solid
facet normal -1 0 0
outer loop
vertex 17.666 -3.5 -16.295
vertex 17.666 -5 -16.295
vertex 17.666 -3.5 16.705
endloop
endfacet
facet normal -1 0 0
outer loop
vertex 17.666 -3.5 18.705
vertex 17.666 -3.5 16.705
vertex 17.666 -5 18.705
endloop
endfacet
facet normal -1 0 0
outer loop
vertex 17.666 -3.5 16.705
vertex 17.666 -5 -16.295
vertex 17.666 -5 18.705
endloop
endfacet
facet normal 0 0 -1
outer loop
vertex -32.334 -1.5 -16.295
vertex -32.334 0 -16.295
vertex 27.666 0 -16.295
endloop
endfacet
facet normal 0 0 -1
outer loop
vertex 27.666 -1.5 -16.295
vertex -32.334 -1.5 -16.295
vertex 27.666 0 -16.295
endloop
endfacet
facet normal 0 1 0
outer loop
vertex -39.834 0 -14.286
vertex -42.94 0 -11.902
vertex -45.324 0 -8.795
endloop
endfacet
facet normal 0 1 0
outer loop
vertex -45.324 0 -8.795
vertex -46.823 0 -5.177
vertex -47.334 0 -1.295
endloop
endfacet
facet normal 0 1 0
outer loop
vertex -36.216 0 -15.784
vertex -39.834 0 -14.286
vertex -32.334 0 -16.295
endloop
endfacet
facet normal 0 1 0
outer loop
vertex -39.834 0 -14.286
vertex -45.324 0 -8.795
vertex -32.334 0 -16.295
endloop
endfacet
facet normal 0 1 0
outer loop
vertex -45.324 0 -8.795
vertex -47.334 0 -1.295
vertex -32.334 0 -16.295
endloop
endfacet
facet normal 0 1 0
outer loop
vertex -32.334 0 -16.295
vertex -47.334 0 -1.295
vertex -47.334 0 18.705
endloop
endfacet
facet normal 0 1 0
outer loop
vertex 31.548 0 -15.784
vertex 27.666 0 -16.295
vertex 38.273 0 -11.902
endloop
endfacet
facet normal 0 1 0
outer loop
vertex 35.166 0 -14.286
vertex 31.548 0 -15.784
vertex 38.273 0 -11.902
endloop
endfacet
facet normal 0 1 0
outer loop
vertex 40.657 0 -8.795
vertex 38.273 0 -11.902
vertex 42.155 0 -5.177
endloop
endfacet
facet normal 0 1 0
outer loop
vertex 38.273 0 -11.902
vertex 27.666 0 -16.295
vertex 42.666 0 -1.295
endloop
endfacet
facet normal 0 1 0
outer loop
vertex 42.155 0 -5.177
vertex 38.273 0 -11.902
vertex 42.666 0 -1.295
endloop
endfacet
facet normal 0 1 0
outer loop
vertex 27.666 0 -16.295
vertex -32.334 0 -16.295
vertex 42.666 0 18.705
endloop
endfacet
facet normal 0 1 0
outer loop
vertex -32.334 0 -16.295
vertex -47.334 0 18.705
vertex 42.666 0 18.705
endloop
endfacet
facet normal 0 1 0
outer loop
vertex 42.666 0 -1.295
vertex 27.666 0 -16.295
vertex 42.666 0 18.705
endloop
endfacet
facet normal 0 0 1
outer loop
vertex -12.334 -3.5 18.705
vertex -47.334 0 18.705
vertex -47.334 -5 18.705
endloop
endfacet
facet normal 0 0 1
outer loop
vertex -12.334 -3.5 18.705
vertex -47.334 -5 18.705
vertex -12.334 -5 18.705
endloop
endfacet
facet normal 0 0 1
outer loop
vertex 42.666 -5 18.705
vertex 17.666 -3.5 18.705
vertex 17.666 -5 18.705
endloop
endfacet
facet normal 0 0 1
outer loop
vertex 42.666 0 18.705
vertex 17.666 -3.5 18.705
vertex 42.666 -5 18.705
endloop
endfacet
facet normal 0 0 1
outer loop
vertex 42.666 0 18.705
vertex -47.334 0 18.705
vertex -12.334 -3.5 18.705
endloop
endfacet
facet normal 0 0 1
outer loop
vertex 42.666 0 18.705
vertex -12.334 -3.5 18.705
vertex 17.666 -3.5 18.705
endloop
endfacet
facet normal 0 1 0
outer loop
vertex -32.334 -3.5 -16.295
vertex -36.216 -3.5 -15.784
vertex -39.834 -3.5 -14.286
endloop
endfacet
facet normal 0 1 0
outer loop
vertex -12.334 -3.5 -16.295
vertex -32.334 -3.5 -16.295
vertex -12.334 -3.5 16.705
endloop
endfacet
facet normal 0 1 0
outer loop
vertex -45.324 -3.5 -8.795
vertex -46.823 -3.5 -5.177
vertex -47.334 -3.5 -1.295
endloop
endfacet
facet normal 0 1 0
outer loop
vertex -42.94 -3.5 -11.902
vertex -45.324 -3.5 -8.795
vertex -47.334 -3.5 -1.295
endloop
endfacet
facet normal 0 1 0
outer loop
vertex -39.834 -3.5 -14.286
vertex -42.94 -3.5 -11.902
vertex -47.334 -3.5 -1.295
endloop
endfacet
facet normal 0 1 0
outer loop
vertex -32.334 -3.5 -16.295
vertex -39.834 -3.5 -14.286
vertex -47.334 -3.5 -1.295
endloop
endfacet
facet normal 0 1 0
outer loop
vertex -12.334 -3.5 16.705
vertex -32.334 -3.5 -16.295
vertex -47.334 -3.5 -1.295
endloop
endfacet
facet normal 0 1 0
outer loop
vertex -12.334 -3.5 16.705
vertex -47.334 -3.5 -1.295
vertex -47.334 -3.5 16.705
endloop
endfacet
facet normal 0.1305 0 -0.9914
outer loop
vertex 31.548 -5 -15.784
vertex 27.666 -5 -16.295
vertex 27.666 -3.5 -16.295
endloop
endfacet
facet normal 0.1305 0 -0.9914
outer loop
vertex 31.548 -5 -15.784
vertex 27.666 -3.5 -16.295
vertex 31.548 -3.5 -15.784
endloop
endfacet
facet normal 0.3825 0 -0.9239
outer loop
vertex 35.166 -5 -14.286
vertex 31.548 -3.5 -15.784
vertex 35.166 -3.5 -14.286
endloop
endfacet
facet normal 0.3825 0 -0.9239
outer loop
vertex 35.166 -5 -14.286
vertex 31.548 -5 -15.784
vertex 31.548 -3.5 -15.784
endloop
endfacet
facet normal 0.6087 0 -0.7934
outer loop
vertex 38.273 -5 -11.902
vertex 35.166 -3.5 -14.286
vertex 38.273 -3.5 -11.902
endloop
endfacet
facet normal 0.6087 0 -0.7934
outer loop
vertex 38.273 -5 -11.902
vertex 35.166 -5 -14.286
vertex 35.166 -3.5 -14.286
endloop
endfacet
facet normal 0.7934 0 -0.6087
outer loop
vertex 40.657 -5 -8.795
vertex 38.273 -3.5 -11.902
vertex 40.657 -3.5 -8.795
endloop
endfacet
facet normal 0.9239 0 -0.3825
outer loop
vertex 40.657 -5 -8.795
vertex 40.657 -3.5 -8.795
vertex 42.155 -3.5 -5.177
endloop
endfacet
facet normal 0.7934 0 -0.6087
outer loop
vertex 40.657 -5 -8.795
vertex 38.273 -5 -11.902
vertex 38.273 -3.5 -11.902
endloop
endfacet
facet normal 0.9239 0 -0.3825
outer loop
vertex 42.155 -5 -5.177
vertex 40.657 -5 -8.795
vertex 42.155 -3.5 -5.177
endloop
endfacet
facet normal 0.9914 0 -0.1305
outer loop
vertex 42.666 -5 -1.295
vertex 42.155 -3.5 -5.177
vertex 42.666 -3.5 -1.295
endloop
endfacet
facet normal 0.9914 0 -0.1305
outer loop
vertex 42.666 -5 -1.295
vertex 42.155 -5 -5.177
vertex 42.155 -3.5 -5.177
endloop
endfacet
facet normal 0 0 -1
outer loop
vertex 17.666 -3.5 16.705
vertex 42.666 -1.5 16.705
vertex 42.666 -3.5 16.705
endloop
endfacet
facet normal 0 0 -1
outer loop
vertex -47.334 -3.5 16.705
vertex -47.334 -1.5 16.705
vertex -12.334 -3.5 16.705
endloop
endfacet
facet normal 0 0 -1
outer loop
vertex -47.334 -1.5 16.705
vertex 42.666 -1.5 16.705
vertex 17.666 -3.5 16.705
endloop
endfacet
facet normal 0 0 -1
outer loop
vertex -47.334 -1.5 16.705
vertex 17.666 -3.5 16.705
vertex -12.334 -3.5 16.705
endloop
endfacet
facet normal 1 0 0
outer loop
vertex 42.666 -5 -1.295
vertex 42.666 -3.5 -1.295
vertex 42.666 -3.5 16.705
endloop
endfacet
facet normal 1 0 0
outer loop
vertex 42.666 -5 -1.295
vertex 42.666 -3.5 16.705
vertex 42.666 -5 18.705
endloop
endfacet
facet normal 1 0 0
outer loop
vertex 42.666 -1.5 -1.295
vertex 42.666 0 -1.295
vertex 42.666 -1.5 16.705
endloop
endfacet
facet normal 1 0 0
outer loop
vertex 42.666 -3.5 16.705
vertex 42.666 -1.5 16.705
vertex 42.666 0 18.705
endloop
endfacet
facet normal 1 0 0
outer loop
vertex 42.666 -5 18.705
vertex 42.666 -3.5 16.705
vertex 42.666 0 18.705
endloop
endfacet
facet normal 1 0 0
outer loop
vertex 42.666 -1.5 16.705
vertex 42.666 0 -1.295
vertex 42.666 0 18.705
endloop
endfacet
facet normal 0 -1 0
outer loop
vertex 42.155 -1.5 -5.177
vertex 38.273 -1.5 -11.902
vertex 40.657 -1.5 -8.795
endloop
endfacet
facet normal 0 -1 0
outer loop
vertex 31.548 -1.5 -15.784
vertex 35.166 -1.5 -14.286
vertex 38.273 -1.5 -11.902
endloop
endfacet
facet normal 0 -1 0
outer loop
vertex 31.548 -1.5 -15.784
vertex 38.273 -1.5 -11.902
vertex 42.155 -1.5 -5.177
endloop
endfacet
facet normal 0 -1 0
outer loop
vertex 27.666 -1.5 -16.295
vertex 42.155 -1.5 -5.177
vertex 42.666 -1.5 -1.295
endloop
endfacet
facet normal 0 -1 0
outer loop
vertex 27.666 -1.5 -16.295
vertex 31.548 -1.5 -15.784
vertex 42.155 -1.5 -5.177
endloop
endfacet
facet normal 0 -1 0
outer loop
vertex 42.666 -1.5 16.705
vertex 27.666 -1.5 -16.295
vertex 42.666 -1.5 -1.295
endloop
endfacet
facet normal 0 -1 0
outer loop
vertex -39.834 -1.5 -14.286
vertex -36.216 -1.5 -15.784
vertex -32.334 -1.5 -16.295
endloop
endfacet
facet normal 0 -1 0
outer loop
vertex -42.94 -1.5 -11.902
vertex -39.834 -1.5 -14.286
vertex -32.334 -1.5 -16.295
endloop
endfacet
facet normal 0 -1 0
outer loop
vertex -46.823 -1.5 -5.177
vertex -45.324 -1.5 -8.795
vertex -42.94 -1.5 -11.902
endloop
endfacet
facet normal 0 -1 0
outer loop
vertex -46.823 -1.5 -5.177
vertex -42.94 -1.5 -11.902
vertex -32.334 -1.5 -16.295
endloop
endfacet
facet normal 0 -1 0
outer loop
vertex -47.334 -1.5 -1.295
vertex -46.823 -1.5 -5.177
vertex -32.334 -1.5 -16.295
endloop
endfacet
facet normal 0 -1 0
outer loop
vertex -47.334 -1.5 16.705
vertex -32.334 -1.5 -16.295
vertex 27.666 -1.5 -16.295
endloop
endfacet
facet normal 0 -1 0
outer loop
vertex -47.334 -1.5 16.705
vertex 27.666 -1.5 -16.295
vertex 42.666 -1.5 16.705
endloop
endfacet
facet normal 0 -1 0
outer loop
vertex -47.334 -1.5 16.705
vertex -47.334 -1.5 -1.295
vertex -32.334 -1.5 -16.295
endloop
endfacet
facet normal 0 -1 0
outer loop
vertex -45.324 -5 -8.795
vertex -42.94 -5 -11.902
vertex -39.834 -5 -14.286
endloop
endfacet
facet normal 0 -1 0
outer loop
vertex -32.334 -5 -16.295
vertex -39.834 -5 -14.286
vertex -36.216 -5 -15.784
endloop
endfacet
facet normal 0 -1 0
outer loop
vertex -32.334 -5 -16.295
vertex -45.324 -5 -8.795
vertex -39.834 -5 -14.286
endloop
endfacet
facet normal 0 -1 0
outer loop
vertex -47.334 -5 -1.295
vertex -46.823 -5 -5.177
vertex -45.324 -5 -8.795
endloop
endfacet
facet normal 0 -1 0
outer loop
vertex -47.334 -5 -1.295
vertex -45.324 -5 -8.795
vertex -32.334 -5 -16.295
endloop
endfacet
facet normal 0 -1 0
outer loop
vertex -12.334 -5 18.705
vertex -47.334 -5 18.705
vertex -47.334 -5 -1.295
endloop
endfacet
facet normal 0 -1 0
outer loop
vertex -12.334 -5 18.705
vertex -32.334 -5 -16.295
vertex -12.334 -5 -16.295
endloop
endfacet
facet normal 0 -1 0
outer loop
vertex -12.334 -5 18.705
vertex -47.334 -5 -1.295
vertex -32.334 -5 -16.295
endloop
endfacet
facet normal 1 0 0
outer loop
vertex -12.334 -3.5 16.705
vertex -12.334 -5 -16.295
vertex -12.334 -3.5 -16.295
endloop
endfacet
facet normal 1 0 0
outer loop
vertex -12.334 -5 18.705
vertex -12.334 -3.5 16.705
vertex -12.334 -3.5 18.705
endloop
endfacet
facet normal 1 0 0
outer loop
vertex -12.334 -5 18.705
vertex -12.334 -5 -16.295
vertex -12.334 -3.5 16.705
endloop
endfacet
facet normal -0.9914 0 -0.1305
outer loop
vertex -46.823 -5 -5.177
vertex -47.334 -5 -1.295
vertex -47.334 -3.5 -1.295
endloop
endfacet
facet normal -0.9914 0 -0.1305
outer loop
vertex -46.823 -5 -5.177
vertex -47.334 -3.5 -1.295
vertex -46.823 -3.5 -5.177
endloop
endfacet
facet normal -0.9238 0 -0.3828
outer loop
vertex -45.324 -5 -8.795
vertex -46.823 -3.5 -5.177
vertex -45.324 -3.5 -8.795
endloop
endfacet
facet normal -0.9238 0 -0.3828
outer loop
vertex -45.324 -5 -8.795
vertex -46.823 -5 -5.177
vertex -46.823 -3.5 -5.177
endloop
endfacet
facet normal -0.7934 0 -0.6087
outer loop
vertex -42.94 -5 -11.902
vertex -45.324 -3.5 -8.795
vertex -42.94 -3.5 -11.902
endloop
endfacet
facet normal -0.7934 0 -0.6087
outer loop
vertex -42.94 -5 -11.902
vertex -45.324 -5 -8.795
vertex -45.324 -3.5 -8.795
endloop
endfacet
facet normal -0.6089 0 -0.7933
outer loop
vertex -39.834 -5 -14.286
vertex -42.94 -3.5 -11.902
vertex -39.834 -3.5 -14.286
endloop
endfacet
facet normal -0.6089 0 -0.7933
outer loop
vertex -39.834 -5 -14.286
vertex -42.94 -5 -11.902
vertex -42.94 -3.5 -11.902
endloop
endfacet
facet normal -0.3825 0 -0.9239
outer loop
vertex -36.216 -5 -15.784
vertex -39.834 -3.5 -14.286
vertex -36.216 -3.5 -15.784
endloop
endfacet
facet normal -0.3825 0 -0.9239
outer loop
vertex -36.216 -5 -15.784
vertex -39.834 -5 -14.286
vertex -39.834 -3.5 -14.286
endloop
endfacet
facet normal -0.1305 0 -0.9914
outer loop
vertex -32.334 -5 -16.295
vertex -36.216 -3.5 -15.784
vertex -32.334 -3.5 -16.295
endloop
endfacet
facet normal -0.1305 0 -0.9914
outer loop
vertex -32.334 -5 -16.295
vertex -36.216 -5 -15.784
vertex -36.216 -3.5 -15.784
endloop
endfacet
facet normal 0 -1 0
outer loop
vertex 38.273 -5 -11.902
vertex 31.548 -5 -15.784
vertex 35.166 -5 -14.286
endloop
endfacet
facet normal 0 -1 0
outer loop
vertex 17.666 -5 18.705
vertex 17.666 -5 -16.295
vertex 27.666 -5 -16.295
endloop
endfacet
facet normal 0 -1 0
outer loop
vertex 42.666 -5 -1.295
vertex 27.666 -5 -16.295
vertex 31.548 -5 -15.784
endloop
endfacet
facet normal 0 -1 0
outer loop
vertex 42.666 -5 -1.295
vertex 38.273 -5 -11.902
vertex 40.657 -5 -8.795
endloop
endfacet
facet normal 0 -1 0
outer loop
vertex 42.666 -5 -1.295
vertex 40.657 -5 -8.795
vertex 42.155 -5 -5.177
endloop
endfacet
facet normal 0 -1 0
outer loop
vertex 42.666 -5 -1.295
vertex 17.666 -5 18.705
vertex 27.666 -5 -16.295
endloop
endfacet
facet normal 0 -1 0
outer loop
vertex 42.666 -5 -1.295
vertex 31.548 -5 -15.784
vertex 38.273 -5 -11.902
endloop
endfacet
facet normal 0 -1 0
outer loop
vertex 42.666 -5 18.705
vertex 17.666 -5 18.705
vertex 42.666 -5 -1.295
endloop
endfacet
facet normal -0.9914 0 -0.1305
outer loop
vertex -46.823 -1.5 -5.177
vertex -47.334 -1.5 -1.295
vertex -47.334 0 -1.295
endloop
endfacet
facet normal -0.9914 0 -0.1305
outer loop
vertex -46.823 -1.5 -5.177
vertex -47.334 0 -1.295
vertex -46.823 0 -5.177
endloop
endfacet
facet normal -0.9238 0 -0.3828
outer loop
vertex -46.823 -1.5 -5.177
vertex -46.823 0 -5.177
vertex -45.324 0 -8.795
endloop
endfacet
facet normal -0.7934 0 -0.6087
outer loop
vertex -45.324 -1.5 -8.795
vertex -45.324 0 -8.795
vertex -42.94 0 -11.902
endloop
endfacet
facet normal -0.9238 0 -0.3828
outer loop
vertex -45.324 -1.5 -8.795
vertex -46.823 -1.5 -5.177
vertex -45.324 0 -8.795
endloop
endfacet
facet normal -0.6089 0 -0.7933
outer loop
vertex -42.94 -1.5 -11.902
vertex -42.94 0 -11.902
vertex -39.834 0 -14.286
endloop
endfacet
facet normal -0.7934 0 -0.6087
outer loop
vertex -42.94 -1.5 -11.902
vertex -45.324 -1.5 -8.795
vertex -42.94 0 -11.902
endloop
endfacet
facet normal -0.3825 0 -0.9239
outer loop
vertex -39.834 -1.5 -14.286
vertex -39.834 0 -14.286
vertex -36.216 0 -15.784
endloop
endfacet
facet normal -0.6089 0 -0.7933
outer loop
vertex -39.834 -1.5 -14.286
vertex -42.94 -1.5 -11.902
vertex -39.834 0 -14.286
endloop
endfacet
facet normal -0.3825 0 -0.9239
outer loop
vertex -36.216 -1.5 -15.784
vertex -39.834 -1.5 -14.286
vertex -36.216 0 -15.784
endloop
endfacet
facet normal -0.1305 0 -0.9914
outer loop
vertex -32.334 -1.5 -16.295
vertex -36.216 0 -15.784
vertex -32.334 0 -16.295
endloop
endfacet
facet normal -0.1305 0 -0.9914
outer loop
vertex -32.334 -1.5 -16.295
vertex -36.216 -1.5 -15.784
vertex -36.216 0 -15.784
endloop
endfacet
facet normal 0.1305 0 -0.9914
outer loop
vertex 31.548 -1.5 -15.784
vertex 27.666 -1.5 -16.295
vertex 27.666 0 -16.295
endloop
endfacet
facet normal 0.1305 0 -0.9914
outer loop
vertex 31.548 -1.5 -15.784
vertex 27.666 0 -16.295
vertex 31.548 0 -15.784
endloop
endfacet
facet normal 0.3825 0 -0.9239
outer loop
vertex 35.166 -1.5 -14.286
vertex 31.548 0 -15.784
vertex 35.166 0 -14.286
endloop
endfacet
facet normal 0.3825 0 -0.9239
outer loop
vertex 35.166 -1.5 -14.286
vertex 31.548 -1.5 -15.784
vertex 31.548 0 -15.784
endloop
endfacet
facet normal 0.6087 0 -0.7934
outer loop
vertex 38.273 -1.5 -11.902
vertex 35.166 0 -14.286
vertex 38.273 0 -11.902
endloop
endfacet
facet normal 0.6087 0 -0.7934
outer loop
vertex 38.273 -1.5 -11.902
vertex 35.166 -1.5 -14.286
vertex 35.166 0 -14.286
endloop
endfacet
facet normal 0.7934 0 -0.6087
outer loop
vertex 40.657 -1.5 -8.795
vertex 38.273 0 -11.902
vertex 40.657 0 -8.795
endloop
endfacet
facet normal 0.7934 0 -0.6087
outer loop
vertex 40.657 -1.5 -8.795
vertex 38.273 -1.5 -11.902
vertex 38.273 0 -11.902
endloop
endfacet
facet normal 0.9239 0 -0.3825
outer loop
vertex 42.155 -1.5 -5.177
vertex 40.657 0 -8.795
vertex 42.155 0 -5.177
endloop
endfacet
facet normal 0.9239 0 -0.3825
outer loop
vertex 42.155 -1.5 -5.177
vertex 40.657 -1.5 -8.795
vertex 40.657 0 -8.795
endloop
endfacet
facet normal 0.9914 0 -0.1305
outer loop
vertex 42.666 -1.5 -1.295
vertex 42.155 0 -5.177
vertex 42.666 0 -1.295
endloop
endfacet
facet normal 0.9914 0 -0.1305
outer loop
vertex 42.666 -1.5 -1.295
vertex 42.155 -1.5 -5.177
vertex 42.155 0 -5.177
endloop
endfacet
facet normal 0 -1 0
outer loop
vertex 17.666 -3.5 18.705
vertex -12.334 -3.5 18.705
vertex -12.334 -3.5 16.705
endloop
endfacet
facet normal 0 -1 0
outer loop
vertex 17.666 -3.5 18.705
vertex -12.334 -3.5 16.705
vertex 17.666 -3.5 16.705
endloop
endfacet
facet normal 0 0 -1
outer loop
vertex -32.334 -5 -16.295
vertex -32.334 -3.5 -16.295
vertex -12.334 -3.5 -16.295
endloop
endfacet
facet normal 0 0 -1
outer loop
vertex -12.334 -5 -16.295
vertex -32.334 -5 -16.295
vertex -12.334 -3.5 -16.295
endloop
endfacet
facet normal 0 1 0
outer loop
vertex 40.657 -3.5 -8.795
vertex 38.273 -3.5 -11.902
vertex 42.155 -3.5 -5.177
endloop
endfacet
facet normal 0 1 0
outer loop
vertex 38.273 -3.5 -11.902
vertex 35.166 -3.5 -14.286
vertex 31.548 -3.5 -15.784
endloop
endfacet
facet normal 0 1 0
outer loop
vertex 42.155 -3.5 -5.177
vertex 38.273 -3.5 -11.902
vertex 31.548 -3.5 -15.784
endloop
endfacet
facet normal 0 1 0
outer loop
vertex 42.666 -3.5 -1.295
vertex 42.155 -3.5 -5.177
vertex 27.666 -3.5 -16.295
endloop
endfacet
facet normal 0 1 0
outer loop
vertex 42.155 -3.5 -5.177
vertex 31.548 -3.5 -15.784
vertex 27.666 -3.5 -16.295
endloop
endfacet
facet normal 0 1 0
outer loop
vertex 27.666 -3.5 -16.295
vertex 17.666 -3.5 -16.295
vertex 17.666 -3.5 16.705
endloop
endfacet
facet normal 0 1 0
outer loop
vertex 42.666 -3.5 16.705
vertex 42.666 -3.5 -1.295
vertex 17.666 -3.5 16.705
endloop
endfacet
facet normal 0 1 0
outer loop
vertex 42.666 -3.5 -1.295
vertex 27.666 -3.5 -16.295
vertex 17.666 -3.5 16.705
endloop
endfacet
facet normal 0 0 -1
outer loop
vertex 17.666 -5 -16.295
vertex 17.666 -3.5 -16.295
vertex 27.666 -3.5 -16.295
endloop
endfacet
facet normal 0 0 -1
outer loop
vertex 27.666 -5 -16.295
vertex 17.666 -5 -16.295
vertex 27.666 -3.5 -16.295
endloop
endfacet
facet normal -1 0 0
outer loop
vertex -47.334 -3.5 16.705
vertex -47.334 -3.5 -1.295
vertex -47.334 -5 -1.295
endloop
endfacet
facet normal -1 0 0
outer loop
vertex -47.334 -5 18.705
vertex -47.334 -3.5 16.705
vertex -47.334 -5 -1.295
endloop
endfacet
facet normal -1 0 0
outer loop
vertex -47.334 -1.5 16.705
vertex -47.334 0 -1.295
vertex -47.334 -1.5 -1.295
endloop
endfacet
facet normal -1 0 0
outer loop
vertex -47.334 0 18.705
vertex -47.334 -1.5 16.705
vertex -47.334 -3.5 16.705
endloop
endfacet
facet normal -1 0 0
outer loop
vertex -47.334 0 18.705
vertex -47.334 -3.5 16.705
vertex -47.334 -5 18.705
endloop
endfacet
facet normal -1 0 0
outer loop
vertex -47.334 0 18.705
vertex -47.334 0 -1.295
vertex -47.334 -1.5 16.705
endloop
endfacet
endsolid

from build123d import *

# Parameters (mm, degrees)
F0_W     = 90
F0_H     = 35
F1_DEPTH = 5
F3_R     = 15
F2_W     = 2
F2_H     = 33
F4_DEPTH = 90
F5_W     = 30
F5_H     = 35
F6_DEPTH = 1.5


with BuildPart() as f1:
    # F0 (on Front) → F1 (new body)
    with BuildSketch(Plane.XZ):
        with Locations((-2.3338645697, 1.2048181861)):
            Rectangle(F0_W, F0_H)
    extrude(amount=F1_DEPTH)

    # F3
    f3_edges = [f1.edges().sort_by_distance(p)[0] for p in [
        (42.666135, -2.5, -16.295182),
        (-47.333865, -2.5, -16.295182),
    ]]
    fillet(f3_edges, radius=F3_R)

    # F2 (on face) → F4 (cut)
    with BuildSketch(Plane(origin=(-47.3338645697, 0, 0), x_dir=(0, -1, 0), z_dir=(-1, 0, 0))):
        with Locations((2.5, 0.2048181861)):
            Rectangle(F2_W, F2_H)
    extrude(amount=-F4_DEPTH, mode=Mode.SUBTRACT)

    # F5 (on face) → F6 (cut)
    with BuildSketch(Plane.XZ.offset(5)):
        with Locations((2.6661354303, 1.2048181861)):
            Rectangle(F5_W, F5_H)
    extrude(amount=-F6_DEPTH, mode=Mode.SUBTRACT)


solid = f1.part
